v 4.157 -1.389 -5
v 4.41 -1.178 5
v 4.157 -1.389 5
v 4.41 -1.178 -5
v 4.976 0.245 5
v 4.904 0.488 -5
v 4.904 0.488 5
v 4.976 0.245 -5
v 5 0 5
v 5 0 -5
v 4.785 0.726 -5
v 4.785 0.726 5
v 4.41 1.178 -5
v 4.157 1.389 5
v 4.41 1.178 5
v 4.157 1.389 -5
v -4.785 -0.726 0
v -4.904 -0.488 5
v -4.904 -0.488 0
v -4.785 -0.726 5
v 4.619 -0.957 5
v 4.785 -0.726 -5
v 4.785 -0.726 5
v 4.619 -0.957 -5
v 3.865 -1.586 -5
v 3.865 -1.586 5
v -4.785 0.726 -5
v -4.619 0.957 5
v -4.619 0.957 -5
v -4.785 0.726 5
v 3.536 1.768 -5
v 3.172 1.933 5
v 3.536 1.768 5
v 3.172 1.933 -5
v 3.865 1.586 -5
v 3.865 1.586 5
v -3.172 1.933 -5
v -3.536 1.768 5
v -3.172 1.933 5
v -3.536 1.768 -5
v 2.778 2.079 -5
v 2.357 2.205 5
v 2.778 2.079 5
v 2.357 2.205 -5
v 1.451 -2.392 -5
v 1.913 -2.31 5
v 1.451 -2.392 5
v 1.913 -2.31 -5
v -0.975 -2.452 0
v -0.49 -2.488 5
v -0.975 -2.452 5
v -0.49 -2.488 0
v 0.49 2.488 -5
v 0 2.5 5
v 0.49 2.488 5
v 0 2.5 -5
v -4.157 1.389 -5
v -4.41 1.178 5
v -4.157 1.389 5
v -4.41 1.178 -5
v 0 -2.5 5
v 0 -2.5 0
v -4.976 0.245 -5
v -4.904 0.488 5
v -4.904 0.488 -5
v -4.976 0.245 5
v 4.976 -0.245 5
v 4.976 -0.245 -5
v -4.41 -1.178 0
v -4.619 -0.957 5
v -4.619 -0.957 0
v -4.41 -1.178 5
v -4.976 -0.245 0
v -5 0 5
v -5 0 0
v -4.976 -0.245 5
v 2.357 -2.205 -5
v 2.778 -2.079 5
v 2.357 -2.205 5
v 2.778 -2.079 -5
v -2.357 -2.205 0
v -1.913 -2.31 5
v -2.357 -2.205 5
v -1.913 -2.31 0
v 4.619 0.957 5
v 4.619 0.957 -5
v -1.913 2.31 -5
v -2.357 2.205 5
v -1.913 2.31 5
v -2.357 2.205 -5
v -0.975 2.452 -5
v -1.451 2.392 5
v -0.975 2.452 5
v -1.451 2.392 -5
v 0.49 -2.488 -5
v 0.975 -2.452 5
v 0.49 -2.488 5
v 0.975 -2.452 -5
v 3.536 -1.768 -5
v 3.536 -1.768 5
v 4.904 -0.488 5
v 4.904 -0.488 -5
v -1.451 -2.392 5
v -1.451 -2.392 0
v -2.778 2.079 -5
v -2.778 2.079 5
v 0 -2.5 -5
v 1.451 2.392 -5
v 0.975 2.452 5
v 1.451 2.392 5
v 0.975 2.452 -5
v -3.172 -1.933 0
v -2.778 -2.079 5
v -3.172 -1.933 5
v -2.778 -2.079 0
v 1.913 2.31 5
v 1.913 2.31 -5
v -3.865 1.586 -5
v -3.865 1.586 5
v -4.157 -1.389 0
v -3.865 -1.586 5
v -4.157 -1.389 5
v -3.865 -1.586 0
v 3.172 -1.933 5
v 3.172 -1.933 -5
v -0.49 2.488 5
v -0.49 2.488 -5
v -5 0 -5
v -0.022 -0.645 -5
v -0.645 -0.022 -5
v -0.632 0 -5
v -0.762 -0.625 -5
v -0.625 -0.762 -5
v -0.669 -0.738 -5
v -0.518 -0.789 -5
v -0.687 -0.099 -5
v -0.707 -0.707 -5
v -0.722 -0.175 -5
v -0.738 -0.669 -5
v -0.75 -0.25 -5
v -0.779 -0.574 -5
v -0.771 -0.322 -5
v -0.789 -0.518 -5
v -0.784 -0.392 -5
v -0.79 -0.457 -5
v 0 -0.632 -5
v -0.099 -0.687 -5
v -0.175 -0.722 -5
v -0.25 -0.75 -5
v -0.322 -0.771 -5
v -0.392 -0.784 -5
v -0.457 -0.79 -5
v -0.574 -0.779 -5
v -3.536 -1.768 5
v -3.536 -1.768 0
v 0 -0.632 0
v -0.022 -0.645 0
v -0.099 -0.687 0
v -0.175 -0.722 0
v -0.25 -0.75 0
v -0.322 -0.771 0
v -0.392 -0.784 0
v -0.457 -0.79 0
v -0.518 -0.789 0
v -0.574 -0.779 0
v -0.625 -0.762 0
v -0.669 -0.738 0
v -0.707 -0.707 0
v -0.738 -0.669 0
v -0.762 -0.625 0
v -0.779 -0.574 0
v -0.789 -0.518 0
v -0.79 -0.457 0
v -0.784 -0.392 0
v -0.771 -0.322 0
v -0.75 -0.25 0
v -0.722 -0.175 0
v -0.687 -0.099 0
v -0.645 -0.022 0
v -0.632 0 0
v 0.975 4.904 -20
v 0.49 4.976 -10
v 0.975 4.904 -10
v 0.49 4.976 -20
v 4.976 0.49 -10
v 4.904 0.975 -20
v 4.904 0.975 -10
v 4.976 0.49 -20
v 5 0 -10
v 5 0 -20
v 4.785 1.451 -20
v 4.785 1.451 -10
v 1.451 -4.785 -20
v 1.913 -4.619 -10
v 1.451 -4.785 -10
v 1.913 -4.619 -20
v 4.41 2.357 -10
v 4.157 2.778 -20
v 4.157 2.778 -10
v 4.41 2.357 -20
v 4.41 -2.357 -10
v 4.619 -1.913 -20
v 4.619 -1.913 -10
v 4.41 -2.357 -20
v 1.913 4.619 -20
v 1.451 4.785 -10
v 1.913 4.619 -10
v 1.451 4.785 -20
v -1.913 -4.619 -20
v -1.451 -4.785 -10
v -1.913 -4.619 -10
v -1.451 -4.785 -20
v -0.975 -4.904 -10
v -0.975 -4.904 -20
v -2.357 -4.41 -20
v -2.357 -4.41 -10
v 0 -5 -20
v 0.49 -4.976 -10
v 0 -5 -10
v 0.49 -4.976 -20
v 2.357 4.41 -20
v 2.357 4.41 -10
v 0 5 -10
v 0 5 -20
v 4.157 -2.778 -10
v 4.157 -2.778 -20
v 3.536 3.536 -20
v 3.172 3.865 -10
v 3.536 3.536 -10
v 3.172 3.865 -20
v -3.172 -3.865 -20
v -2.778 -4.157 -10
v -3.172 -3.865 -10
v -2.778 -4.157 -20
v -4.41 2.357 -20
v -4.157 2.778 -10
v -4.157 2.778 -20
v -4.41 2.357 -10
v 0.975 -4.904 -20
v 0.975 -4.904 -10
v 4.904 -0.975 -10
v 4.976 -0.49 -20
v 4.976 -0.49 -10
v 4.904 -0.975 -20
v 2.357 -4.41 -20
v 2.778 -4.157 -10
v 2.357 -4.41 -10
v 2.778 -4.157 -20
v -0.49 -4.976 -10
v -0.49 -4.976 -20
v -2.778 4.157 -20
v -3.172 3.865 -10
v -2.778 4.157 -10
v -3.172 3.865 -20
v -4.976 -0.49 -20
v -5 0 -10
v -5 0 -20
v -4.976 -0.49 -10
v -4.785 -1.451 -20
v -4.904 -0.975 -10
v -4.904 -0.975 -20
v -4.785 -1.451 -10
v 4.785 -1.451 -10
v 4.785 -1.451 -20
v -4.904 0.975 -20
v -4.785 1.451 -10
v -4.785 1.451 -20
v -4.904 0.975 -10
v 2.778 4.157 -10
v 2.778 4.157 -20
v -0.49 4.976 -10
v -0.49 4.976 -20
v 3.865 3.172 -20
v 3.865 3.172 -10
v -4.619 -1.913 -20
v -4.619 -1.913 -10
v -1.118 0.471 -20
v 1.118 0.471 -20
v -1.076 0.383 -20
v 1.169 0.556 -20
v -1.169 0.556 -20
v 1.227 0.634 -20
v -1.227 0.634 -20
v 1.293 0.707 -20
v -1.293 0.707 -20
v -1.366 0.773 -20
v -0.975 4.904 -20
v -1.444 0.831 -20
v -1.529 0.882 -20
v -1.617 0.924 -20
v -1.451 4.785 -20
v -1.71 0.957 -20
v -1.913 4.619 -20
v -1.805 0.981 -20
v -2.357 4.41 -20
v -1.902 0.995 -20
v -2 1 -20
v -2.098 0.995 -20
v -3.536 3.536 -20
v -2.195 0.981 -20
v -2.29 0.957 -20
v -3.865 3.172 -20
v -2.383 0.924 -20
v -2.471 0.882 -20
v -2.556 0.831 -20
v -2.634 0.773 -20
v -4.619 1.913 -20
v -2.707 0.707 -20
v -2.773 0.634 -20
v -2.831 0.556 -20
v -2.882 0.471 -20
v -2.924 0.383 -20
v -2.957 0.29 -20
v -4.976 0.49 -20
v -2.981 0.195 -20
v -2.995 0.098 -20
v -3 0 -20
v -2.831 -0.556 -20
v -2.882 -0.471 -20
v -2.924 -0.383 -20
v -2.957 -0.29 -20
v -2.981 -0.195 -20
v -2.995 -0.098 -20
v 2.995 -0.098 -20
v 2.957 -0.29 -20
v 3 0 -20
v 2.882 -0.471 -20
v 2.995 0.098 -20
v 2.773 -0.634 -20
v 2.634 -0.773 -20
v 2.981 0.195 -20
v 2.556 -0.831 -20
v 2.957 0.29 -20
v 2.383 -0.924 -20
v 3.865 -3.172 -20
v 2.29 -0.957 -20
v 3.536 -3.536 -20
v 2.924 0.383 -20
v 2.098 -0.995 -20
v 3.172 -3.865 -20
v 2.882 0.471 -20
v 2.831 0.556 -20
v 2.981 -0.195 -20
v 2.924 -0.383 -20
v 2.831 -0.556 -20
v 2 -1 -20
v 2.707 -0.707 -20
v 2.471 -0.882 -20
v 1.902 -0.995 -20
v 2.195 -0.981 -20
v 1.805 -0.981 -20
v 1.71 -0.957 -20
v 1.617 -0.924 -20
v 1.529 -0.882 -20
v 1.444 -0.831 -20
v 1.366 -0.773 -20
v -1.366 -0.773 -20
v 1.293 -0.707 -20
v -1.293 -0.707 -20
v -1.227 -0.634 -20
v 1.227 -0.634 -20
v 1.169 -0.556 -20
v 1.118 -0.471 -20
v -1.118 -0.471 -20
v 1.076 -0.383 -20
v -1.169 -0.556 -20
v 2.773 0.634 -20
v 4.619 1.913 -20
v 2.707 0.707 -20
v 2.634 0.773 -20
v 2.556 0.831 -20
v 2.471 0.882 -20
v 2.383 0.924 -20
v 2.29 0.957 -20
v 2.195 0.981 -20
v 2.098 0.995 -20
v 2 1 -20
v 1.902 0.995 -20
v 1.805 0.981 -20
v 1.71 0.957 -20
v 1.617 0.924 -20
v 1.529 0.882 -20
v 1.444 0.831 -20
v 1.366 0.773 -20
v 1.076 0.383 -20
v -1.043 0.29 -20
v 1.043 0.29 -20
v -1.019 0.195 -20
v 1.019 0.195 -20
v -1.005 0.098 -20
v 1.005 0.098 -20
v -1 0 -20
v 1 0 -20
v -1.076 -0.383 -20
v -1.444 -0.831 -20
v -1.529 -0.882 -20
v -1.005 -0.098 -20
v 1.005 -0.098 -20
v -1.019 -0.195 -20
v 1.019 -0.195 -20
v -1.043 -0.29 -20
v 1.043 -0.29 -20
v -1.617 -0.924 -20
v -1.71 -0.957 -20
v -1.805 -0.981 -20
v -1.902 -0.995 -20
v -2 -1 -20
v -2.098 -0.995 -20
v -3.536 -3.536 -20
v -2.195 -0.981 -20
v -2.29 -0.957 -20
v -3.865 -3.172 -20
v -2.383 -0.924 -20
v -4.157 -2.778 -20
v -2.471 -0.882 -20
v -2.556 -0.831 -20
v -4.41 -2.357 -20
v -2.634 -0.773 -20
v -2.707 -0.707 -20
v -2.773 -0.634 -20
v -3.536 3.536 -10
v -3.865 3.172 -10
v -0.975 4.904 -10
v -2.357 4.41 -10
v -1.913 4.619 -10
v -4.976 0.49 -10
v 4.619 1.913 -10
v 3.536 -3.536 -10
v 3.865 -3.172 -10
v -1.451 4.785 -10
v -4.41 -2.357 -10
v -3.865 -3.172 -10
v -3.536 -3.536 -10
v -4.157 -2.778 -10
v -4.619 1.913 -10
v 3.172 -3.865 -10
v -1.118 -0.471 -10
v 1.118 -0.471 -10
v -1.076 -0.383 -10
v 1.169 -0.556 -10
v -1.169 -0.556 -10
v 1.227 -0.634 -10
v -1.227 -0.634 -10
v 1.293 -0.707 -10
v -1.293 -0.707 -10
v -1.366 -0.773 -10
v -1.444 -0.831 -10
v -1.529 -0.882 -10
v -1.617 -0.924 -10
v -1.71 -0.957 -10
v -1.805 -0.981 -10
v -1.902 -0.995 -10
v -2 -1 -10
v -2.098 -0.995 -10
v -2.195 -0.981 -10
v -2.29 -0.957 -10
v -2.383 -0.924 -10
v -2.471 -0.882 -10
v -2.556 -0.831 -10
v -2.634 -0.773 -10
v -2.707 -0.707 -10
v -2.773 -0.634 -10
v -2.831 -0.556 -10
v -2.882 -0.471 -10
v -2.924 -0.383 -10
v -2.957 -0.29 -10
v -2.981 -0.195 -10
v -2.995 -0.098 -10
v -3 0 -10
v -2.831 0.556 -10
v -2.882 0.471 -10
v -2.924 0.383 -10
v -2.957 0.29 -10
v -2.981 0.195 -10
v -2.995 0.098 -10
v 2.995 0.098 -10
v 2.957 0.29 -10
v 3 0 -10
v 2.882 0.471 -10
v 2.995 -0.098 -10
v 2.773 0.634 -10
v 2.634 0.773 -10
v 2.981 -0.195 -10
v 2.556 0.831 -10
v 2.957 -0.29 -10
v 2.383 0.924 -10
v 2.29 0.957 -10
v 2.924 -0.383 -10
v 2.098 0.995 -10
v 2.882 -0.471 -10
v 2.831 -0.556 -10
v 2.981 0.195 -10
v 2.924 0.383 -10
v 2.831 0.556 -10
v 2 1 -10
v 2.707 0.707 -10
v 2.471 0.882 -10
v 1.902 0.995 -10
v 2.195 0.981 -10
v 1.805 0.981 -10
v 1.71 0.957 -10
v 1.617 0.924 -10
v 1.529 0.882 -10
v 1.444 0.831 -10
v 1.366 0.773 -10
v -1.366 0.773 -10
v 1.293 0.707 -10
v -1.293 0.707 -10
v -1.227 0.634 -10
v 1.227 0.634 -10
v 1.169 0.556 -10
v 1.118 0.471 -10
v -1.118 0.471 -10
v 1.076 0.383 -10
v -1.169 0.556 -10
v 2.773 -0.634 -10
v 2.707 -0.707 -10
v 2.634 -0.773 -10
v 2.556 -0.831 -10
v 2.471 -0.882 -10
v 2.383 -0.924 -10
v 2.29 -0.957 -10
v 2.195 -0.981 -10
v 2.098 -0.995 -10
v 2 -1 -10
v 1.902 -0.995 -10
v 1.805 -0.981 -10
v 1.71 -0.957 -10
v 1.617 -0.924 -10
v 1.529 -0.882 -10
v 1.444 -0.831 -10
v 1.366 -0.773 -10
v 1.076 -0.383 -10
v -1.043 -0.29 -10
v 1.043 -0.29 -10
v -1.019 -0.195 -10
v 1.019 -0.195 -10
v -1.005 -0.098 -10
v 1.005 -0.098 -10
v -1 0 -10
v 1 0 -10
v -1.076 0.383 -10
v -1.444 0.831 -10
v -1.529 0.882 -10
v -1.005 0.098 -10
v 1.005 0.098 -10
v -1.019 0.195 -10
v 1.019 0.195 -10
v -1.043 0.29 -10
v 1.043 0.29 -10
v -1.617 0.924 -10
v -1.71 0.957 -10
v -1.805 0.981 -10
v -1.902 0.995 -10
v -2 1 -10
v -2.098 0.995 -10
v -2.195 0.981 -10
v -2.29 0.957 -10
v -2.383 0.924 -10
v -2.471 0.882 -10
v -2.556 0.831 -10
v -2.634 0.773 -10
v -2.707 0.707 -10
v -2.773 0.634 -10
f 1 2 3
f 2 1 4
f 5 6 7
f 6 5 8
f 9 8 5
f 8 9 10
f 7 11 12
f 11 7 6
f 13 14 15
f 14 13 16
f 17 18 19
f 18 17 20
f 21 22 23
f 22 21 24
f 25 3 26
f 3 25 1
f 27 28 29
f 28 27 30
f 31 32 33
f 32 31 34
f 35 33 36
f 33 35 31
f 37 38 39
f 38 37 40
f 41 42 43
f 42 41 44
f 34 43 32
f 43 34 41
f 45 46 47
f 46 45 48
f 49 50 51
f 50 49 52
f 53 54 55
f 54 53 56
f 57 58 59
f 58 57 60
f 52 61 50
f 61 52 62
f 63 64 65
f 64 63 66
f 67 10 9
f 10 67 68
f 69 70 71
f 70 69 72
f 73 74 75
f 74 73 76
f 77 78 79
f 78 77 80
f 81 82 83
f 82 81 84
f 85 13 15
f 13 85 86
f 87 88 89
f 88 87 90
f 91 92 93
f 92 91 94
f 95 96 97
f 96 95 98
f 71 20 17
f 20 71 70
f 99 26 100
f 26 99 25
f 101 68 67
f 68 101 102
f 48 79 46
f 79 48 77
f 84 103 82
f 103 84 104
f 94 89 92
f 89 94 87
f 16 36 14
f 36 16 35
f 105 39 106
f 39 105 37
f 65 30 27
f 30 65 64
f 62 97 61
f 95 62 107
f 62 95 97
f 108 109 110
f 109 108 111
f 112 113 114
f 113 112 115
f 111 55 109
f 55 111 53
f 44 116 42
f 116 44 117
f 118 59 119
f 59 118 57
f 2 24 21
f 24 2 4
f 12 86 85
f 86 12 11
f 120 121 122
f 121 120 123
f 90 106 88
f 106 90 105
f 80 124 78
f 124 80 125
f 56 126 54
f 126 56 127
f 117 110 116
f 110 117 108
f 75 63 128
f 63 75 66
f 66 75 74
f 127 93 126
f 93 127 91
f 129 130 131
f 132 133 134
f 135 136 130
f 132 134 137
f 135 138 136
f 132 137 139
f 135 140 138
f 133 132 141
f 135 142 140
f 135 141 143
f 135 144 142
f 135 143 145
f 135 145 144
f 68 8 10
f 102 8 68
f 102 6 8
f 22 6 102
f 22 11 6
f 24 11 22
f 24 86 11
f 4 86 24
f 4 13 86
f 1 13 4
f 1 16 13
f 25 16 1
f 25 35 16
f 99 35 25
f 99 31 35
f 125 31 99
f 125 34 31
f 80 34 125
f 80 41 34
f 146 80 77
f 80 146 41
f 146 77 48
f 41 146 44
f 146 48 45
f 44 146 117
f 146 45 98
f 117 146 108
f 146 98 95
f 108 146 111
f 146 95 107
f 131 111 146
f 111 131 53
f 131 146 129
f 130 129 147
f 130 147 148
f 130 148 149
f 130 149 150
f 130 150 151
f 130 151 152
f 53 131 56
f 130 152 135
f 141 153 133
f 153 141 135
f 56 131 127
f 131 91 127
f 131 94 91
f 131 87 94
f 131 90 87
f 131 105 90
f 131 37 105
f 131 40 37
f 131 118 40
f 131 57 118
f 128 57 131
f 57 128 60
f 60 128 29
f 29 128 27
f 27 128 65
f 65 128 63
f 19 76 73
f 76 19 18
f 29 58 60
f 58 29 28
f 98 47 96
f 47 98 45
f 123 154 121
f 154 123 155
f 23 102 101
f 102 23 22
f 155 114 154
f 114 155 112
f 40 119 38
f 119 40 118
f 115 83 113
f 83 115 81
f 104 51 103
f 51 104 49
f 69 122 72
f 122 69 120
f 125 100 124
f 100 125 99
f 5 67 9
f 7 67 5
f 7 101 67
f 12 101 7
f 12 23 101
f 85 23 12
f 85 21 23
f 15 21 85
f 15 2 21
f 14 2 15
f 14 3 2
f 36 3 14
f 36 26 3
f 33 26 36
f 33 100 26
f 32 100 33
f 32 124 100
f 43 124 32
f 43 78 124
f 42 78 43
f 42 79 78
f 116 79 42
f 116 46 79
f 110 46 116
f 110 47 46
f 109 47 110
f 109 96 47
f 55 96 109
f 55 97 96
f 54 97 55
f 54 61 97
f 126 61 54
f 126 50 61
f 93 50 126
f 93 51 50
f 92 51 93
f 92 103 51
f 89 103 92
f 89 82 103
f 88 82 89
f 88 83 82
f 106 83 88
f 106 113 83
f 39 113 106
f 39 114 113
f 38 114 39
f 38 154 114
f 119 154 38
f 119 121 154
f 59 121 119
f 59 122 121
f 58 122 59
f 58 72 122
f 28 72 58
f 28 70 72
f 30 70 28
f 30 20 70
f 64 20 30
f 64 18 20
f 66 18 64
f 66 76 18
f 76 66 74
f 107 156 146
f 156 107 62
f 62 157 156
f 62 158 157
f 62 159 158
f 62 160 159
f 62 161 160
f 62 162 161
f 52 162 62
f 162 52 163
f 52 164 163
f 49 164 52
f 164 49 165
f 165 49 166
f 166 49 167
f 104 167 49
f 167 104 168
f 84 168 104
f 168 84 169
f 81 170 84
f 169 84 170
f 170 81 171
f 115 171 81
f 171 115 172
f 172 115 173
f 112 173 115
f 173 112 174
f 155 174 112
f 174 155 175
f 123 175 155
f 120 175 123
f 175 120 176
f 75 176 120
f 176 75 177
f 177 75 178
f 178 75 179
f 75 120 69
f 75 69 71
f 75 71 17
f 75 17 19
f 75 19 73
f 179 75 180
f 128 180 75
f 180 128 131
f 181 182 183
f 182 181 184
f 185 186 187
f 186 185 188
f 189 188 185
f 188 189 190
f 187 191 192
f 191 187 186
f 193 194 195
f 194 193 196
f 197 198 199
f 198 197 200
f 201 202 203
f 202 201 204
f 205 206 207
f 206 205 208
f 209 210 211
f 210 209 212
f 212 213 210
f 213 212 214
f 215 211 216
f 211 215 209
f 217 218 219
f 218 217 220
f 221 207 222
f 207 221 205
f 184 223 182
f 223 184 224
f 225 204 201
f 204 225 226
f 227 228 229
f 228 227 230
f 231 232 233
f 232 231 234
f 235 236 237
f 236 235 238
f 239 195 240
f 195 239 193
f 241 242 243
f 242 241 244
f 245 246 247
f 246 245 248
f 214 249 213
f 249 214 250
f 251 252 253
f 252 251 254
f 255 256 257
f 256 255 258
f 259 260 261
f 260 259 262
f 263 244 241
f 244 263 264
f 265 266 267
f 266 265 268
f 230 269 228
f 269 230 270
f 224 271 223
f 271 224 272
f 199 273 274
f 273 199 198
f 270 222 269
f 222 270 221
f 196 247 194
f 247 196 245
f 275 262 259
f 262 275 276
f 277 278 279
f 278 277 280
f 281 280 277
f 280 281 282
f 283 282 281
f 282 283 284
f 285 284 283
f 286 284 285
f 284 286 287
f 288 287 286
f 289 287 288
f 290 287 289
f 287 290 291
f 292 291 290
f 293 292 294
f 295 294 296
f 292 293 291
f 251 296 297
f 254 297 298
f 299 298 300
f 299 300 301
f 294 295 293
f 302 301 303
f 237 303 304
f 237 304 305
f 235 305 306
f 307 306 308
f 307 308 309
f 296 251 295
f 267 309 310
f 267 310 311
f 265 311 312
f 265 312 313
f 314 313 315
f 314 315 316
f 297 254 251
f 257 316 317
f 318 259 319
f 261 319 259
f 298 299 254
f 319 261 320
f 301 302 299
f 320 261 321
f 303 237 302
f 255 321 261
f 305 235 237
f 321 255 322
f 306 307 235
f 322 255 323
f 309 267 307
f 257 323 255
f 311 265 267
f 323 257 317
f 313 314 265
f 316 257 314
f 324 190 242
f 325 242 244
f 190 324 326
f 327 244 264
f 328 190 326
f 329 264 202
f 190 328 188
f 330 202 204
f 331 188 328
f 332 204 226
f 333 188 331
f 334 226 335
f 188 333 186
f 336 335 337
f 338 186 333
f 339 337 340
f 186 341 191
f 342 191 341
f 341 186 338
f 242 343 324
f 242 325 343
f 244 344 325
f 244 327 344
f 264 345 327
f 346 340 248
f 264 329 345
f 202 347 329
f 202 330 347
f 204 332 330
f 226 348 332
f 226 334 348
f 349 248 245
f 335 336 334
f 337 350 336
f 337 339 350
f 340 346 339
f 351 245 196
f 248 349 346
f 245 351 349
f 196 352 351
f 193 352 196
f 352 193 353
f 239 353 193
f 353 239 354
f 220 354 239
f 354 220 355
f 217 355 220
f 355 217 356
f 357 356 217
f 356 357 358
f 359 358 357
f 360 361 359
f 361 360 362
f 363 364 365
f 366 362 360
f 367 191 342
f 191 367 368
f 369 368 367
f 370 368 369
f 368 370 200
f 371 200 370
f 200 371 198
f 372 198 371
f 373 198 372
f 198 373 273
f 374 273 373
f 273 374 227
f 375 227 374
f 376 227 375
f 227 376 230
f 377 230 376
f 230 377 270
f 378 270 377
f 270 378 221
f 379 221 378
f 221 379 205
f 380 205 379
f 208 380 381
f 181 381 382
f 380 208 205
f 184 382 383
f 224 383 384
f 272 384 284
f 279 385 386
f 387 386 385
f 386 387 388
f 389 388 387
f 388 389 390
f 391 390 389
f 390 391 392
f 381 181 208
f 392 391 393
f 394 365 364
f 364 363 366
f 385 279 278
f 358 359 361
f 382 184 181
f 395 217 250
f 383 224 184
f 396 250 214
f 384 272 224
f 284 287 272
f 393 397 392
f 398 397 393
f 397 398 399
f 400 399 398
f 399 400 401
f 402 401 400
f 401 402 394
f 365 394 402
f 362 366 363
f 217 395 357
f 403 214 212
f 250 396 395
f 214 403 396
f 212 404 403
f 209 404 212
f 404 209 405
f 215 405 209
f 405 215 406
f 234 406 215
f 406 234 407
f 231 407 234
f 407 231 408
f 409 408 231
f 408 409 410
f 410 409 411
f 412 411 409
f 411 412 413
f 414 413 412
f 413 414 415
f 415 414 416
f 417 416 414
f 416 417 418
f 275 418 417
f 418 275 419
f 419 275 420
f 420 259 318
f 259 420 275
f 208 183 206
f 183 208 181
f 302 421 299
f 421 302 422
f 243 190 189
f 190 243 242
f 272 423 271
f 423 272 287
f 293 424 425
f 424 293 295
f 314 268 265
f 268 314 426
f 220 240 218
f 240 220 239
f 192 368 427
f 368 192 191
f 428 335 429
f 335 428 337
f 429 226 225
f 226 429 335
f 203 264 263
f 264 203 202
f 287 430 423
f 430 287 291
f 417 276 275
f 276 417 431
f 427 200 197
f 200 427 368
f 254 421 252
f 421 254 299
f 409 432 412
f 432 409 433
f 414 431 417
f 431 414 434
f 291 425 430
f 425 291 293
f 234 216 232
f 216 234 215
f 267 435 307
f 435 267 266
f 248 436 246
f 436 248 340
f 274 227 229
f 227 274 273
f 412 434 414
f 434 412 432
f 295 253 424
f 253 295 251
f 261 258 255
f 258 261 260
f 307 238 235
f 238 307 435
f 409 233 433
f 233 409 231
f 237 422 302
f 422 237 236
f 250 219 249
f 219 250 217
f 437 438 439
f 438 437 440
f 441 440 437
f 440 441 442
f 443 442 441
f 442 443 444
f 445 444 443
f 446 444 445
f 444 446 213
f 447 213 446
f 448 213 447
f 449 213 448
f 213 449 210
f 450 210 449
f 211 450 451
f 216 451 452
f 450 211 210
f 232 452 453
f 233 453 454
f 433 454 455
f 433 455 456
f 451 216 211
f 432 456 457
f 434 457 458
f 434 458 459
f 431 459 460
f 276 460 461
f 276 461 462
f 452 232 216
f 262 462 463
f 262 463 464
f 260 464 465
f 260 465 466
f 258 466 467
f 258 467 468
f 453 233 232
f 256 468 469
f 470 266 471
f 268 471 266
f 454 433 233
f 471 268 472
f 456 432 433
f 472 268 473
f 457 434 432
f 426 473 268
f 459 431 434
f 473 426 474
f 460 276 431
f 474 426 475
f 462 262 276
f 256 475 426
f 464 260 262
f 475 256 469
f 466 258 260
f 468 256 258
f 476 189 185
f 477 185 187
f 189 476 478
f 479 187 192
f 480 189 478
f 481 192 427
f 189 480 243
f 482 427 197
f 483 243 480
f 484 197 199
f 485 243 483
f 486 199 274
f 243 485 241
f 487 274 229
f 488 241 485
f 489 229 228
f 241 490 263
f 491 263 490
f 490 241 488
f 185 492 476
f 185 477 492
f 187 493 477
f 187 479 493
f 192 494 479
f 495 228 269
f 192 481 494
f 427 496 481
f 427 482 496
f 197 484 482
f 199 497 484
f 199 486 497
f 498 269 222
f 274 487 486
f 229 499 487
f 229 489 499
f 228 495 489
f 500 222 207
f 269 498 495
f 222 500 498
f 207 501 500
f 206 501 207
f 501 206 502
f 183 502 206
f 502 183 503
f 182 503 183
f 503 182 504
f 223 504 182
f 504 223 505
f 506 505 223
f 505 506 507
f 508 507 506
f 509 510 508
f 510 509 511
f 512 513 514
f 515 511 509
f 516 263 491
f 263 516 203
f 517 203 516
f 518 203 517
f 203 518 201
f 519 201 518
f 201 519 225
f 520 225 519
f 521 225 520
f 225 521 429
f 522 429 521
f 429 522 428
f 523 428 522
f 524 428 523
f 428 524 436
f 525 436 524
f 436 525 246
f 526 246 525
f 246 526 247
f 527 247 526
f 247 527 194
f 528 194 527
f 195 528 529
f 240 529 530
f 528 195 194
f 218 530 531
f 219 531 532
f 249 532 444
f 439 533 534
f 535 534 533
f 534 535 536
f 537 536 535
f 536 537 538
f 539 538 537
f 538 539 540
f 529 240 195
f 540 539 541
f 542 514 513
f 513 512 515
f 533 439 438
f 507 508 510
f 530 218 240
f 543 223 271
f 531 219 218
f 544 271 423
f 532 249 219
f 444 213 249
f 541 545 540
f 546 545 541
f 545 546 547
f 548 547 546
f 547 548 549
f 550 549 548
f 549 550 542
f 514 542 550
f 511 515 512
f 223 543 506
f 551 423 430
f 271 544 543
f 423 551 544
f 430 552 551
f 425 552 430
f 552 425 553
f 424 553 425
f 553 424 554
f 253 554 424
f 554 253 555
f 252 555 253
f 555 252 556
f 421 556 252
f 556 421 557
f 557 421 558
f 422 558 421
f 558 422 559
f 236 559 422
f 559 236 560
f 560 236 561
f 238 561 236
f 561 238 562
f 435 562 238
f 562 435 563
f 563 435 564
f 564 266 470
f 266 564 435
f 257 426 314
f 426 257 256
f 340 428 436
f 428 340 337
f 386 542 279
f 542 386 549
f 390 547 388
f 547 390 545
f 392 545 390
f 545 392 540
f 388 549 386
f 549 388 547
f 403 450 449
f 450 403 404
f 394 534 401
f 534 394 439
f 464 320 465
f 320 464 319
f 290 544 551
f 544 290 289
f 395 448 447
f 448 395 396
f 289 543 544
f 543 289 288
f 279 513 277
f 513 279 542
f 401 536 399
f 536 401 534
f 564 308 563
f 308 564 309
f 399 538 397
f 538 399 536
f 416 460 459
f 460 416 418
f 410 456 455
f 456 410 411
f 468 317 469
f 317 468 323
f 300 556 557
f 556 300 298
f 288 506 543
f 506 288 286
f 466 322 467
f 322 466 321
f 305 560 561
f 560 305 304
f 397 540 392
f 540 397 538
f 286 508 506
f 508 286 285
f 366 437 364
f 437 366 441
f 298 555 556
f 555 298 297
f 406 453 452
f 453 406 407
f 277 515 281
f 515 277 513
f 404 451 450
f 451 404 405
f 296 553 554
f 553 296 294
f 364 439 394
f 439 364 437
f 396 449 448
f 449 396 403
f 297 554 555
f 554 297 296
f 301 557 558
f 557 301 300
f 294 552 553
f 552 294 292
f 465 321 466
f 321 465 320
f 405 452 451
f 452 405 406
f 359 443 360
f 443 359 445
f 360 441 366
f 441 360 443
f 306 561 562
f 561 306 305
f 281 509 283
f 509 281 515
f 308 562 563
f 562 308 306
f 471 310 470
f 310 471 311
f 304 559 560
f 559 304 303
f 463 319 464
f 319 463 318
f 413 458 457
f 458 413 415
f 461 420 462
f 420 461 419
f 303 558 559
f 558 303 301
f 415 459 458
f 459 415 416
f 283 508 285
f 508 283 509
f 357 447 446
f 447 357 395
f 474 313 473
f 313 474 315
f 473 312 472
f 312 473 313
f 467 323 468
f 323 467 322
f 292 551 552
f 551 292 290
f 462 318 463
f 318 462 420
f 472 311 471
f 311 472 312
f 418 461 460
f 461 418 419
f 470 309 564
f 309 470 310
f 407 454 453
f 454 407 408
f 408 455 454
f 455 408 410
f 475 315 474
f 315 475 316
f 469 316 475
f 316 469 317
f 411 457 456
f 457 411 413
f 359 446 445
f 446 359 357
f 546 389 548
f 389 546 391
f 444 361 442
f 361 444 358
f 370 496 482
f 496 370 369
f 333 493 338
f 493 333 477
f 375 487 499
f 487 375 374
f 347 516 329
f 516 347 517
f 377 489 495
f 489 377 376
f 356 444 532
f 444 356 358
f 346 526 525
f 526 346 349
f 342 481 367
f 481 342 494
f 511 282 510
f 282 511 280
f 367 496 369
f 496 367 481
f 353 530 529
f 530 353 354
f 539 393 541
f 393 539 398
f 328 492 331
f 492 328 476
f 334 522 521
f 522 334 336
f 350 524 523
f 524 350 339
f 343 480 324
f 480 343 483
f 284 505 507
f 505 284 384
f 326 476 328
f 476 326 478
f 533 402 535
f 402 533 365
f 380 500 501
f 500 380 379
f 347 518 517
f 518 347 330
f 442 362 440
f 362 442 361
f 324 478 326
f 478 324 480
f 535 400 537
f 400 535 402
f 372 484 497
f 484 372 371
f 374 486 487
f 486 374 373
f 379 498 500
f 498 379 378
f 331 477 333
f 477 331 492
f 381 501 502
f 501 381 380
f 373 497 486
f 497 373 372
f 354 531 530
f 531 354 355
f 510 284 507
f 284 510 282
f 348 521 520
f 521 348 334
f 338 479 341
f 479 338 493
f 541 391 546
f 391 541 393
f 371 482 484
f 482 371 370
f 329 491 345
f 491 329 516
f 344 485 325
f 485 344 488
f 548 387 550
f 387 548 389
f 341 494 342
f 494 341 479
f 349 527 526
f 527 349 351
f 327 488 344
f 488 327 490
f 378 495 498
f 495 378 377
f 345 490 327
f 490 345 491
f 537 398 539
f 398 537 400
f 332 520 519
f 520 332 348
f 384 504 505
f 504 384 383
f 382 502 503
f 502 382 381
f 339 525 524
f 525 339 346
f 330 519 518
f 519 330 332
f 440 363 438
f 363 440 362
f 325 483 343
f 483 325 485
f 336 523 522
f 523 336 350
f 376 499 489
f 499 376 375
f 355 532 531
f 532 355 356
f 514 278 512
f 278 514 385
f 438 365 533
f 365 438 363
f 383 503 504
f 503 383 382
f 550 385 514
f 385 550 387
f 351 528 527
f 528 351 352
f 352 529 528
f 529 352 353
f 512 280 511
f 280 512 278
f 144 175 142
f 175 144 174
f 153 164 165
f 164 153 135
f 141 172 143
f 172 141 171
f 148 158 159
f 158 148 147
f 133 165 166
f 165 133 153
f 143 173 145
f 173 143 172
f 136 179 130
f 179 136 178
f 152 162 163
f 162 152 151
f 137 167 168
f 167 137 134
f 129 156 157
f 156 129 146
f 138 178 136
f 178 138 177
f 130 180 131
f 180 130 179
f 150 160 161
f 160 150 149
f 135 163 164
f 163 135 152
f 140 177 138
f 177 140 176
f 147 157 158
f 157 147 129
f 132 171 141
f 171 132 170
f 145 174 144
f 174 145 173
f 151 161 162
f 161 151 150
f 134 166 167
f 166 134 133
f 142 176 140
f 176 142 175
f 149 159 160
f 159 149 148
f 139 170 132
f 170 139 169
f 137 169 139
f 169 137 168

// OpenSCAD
module mounting_bracket() {
    $fn = 64;
    
    // Central barrel-shaped body
    module barrel_body() {
        difference() {
            scale([1, 0.5, 1])
                cylinder(h=10, r=5, center=true);
            translate([-5, -2.5, -5])
                cube([10, 5, 10], center=true);
        }
    }
    
    // Rounded tab with two holes
    module rounded_tab() {
        difference() {
            translate([0, 0, -5])
                cylinder(h=10, r=5, center=true);
            translate([-2, 0, -5])
                cylinder(h=10, r=1, center=true);
            translate([2, 0, -5])
                cylinder(h=10, r=1, center=true);
        }
    }
    
    // Forked clevis with U-shaped opening
    module forked_clevis() {
        difference() {
            translate([0, 0, 5])
                cube([10, 5, 10], center=true);
            translate([0, 0, 5])
                cylinder(h=10, r=5, center=true);
            translate([0, 0, 5])
                cube([10, 5, 10], center=true);
            translate([-5, 0, 5])
                cube([10, 5, 10], center=true);
            translate([0, 0, 5])
                cube([10, 5, 10], center=true);
        }
    }
    
    // Diamond-shaped hole in the main body
    module diamond_hole() {
        rotate([0, 0, 45])
            translate([0, 0, 0])
                scale([1, 0.5, 1])
                    cylinder(h=10, r=1, center=true);
    }
    
    // Assemble the mounting bracket
    union() {
        barrel_body();
        translate([0, 0, -10])
            rounded_tab();
        translate([0, 0, 10])
            forked_clevis();
        diamond_hole();
    }
}

mounting_bracket();
